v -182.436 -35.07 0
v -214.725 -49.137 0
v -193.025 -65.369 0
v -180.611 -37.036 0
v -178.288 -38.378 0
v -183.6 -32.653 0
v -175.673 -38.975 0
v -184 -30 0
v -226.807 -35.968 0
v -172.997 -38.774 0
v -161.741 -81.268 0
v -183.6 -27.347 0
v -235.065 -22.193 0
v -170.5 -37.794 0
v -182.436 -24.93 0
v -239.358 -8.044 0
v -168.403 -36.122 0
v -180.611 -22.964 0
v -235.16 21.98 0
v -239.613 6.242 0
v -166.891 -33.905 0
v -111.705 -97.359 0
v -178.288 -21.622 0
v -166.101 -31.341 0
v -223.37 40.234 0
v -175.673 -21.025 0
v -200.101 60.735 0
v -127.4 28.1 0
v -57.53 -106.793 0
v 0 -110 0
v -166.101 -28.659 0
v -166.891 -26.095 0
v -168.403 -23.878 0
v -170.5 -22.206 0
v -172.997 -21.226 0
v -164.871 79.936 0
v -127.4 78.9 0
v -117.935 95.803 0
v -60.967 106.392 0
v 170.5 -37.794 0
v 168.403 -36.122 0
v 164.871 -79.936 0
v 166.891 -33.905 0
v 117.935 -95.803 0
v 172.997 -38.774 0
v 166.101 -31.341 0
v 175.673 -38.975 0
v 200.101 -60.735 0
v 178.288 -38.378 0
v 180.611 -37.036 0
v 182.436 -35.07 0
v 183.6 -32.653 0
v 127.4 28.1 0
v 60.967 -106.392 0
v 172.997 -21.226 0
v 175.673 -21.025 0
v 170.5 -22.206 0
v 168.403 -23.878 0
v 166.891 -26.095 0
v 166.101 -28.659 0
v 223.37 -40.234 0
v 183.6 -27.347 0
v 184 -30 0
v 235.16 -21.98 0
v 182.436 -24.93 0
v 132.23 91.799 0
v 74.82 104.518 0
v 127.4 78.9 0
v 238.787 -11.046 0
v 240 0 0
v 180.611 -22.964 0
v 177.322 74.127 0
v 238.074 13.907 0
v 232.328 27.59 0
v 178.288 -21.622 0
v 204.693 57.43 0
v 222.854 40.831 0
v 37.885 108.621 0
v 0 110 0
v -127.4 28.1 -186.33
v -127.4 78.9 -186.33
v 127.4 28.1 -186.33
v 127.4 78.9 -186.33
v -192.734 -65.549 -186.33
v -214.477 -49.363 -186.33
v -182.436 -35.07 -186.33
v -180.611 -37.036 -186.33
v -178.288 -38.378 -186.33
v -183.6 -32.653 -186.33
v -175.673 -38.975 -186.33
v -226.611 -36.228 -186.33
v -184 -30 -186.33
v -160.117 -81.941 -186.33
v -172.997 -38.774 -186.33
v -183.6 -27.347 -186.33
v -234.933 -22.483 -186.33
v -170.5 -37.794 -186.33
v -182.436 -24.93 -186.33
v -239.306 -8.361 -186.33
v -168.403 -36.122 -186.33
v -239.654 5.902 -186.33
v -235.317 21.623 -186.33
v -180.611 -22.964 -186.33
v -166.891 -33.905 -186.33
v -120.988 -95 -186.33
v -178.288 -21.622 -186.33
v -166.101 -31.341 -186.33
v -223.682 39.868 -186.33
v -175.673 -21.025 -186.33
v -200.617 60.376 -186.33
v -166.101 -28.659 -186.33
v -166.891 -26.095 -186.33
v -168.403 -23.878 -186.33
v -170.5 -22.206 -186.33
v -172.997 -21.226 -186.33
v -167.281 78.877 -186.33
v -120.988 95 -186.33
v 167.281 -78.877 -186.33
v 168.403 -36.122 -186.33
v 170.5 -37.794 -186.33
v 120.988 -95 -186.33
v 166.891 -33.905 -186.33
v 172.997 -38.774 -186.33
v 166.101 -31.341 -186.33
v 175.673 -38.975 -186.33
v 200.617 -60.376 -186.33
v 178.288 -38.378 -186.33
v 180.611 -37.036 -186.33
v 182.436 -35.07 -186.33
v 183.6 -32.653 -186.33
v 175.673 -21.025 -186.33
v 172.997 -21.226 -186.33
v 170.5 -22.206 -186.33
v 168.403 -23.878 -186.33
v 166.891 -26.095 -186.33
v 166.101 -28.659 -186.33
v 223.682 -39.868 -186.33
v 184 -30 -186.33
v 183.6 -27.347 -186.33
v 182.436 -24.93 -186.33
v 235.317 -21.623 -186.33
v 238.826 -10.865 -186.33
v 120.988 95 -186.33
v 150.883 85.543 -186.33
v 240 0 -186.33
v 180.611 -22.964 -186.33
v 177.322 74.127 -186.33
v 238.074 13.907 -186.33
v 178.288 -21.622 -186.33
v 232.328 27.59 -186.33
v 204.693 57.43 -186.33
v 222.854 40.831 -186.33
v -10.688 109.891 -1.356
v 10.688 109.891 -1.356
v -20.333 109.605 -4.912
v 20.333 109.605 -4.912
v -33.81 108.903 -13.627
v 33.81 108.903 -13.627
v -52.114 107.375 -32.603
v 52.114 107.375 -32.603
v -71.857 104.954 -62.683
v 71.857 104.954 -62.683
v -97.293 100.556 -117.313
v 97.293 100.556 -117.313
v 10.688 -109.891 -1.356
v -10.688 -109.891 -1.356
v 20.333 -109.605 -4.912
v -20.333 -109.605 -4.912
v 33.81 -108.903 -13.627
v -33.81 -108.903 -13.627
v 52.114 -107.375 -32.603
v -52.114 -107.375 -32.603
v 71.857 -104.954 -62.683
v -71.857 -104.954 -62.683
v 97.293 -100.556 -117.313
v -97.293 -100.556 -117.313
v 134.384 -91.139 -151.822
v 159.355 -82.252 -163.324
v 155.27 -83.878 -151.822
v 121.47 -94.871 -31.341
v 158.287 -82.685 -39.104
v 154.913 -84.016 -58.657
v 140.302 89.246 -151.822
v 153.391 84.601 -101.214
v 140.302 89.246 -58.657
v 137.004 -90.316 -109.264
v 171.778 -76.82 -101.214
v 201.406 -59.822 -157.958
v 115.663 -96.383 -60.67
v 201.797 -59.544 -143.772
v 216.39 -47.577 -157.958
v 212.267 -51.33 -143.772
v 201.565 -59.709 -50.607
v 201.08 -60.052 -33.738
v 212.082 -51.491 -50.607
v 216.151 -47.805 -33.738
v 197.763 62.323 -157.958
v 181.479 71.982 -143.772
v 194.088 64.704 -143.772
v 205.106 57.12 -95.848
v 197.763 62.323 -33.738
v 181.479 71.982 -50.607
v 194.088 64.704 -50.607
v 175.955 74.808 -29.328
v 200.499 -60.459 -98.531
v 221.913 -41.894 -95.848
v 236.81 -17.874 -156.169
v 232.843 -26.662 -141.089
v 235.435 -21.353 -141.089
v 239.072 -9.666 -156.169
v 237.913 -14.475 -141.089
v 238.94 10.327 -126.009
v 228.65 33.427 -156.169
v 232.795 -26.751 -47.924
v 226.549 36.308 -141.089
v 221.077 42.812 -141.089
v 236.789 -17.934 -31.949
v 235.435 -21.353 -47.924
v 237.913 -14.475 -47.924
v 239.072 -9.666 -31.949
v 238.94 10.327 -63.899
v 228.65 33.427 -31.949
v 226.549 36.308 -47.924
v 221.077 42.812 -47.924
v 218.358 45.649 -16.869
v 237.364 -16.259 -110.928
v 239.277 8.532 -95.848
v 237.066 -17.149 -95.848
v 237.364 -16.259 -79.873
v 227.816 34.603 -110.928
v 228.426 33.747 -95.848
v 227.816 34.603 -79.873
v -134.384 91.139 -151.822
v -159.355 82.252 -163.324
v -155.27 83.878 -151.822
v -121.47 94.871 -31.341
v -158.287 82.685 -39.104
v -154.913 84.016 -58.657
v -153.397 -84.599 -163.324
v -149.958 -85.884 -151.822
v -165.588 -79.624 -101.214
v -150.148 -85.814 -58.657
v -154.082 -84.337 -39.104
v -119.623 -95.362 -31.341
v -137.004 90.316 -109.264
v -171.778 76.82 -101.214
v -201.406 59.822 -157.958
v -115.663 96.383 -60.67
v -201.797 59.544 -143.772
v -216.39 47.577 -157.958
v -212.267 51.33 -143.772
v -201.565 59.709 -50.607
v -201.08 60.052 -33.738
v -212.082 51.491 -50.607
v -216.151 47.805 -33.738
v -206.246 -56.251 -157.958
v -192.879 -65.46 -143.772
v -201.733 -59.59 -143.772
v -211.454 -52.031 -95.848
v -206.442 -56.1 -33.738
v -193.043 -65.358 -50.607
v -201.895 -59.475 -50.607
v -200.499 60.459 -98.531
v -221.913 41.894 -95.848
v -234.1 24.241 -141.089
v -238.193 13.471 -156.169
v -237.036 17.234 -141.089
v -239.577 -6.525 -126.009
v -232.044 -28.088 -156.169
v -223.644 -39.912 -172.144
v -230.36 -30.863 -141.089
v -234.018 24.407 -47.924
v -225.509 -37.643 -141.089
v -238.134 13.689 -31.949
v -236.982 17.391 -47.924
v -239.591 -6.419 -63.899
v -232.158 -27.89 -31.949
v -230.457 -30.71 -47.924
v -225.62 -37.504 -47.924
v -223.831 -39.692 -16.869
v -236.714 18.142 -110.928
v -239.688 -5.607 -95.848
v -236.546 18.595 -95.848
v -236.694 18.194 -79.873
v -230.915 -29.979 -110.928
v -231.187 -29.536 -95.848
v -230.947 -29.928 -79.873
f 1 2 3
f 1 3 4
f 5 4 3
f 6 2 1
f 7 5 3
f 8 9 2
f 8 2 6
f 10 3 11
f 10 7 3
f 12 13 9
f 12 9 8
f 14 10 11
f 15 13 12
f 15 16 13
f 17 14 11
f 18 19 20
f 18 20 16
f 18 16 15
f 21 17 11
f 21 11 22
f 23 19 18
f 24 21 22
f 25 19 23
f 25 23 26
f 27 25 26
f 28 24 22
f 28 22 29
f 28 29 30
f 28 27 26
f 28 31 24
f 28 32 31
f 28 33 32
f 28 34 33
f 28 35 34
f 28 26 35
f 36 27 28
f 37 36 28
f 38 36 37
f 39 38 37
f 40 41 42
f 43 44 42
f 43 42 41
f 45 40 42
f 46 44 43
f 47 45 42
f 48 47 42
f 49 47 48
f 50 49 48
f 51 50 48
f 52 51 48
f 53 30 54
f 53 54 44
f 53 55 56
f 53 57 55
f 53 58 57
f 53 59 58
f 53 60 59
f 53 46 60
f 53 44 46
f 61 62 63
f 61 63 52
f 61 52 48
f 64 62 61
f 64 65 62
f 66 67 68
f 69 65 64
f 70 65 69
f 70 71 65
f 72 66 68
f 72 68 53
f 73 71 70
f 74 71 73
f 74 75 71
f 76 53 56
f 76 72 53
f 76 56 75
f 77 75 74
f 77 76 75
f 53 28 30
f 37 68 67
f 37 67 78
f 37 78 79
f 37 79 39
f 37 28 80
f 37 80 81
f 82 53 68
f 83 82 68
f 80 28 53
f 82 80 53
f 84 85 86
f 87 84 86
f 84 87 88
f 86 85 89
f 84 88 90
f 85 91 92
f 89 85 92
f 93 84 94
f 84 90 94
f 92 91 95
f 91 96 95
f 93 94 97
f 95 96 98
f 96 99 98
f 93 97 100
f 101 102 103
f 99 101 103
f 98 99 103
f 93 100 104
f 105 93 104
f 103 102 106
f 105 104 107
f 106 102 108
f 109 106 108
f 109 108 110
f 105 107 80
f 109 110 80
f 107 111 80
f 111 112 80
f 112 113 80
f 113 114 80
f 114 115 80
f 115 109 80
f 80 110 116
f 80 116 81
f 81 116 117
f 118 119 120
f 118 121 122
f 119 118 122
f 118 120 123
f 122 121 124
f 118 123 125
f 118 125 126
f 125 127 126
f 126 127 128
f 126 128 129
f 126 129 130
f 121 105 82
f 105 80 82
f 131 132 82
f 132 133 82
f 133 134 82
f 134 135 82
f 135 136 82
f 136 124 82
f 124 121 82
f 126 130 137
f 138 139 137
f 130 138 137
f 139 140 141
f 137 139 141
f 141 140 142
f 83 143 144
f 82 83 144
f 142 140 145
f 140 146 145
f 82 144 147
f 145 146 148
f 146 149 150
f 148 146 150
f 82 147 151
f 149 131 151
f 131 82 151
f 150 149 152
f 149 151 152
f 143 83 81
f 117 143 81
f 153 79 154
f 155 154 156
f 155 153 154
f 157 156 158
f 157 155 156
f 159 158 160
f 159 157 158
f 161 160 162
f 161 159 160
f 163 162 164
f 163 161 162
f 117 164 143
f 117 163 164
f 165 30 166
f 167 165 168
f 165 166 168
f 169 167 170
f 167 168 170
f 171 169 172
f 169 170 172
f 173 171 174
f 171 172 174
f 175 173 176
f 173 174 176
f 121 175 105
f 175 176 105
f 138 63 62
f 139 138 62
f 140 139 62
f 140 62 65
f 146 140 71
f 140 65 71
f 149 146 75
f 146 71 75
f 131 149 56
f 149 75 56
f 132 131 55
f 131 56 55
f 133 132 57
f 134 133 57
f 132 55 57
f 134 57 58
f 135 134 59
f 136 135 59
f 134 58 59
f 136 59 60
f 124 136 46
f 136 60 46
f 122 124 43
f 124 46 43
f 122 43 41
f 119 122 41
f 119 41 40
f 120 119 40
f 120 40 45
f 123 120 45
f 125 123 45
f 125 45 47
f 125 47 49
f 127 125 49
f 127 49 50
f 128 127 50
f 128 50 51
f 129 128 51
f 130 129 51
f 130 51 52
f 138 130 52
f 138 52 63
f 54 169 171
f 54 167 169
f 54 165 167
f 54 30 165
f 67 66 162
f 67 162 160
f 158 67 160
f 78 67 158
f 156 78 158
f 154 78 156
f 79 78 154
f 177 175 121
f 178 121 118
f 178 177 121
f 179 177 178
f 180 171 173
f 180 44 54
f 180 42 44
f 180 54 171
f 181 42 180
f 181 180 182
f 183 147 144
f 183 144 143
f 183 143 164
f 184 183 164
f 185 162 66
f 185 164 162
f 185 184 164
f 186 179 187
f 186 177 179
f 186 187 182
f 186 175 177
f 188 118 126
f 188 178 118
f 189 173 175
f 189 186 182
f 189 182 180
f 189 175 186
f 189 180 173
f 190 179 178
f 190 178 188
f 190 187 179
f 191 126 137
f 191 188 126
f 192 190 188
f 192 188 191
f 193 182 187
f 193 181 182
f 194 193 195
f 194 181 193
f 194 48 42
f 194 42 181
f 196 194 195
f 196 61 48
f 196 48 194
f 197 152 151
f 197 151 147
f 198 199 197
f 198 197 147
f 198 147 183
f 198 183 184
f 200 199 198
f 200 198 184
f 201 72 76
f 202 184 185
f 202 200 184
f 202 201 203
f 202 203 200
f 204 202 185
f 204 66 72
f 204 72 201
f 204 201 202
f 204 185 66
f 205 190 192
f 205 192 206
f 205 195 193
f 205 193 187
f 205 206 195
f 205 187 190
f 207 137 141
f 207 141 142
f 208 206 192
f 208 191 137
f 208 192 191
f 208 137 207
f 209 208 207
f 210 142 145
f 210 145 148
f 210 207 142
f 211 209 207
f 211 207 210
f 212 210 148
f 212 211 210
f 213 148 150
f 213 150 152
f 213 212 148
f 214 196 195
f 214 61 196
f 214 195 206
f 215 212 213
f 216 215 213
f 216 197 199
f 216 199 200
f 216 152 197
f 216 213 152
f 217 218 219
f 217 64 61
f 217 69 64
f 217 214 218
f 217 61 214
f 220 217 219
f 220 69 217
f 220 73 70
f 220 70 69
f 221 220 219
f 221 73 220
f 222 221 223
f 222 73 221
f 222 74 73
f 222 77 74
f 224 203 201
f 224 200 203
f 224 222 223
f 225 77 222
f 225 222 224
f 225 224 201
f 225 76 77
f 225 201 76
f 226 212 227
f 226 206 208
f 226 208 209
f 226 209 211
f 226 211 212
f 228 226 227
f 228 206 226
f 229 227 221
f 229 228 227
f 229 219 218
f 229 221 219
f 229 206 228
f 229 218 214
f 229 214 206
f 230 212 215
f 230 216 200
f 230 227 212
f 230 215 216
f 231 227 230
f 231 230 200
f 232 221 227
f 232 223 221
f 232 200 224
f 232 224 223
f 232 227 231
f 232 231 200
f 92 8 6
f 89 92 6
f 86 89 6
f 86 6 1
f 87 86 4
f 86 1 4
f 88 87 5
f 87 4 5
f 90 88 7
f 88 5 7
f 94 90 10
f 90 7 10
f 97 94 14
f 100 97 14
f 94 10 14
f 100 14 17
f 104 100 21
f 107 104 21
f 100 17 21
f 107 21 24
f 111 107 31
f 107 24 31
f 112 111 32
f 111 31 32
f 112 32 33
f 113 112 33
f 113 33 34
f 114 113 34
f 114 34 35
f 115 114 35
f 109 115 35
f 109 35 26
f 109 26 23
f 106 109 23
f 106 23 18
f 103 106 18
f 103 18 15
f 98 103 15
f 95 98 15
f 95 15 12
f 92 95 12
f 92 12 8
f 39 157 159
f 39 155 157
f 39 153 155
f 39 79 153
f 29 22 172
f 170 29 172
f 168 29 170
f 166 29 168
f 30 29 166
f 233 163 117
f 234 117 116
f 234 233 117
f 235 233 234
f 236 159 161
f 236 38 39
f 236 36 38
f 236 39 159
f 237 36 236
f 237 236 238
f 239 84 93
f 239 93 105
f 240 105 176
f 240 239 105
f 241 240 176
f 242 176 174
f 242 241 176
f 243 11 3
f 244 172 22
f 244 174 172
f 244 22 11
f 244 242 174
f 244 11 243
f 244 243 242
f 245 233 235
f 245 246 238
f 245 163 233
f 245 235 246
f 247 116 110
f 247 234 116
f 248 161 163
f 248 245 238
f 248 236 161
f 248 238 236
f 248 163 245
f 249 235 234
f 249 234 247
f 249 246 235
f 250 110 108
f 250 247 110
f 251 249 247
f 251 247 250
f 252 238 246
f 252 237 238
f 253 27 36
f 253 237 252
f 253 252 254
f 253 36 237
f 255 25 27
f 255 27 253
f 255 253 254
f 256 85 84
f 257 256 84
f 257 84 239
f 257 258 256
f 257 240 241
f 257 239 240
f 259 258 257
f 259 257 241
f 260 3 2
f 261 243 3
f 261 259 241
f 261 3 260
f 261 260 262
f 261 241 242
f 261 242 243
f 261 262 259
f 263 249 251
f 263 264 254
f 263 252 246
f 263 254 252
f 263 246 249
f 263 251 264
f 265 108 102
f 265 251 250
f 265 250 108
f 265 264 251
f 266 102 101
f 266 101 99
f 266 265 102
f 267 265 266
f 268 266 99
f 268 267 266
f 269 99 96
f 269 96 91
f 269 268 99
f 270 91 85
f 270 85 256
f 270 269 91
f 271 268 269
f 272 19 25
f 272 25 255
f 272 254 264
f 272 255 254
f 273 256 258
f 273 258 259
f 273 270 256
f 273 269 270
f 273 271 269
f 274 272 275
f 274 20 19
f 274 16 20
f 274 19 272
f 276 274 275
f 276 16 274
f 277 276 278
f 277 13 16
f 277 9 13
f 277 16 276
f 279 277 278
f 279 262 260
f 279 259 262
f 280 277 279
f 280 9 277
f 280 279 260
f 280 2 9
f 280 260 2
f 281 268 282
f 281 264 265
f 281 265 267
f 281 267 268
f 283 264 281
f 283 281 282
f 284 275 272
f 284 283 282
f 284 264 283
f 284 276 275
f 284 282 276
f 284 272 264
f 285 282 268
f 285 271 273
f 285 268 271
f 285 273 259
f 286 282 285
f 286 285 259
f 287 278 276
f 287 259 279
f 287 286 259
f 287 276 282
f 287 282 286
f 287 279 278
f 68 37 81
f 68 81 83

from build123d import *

# Parameters (mm, degrees)
SKETCH1_RX              = 240
SKETCH1_RY              = 110
BOSS_EXTRUDE1_DEPTH     = 186.33
SKETCH10_W              = 254.8
SKETCH10_H              = 50.8
CUT_EXTRUDE5_DEPTH      = 324.139085999
SKETCH12_R              = 9
CUT_EXTRUDE8_DEPTH      = 324.139085999
CUT_EXTRUDE9_DEPTH      = 324.139085999
CUT_EXTRUDE9_DEPTH_BACK = 324.139085999


with BuildPart() as part:
    # Sketch1 → Boss-Extrude1 (new body)
    with BuildSketch(Plane.XY):
        with Locations((0, 0)):
            Ellipse(SKETCH1_RX, SKETCH1_RY)
    extrude(amount=-BOSS_EXTRUDE1_DEPTH)

    # Sketch10 → Cut-Extrude5 (cut, through all)
    with BuildSketch(Plane.XY):
        with Locations((0, 53.5)):
            Rectangle(SKETCH10_W, SKETCH10_H)
    extrude(amount=-CUT_EXTRUDE5_DEPTH, mode=Mode.SUBTRACT)

    # Sketch12 → Cut-Extrude8 (cut, through all)
    with BuildSketch(Plane.XY):
        with Locations((175, -30)):
            Circle(SKETCH12_R)
        with Locations(Location((-175, -30, 0), (0, 0, 180))):
            Circle(SKETCH12_R)
    extrude(amount=-CUT_EXTRUDE8_DEPTH, mode=Mode.SUBTRACT)

    # Sketch14 → Cut-Extrude9 (cut, two sides: drawn at the far end of the back side and taken through both)
    with BuildSketch(Plane(origin=(0, 0, 0), x_dir=(0, 0, -1), z_dir=(1, 0, 0)).offset(-CUT_EXTRUDE9_DEPTH_BACK)):
        Polygon((0, 110), (186.33, 95), (186.33, 110), align=None)
        Polygon((0, -110), (186.33, -95), (186.33, -110), align=None)
    extrude(amount=CUT_EXTRUDE9_DEPTH + CUT_EXTRUDE9_DEPTH_BACK, mode=Mode.SUBTRACT)


solid = part.part
